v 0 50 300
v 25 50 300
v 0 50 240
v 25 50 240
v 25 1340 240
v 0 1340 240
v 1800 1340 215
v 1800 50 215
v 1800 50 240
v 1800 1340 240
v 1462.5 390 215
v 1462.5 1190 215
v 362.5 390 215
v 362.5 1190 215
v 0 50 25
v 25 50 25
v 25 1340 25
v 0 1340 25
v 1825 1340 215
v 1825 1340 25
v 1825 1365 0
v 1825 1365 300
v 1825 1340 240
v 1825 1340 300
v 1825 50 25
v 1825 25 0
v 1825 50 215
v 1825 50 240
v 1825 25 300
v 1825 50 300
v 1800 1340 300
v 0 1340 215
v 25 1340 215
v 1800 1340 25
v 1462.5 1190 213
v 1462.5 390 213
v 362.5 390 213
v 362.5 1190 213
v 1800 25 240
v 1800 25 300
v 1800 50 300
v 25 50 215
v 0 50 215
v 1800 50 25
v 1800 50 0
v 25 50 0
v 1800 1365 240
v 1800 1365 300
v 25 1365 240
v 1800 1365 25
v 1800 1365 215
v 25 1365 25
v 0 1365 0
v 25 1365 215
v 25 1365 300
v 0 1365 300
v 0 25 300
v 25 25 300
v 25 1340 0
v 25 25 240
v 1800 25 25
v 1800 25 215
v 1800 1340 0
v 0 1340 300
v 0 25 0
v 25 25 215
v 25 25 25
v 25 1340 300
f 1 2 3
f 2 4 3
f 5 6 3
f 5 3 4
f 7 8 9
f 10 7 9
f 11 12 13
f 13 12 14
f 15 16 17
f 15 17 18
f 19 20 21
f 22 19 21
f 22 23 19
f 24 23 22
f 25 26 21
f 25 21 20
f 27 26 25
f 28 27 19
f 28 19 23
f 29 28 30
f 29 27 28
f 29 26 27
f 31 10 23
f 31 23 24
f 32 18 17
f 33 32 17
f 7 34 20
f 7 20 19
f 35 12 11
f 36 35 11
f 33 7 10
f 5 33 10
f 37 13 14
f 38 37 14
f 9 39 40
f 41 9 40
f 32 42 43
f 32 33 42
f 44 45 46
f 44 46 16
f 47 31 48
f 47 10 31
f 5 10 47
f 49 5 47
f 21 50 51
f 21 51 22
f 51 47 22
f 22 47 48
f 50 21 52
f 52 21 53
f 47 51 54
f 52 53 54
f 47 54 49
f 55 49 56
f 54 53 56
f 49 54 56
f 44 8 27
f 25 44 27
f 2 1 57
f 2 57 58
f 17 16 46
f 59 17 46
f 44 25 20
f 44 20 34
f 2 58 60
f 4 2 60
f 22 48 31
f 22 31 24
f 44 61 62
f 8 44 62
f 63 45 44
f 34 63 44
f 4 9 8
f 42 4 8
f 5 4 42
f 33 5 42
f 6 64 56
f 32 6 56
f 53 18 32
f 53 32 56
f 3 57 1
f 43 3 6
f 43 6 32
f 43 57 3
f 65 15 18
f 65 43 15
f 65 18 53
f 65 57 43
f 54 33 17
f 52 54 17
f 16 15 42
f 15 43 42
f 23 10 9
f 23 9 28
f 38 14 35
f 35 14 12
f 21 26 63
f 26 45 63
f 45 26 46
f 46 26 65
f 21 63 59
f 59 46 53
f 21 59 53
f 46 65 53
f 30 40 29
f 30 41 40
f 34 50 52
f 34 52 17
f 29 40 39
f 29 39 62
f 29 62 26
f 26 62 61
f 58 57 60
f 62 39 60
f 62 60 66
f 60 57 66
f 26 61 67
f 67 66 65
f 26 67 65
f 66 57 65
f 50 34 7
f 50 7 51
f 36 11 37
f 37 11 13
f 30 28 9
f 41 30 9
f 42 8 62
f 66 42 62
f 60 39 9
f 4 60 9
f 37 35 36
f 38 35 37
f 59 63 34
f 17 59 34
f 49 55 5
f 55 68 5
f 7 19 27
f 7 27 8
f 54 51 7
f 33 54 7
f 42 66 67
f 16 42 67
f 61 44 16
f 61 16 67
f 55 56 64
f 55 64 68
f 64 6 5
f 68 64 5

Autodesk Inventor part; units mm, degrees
ref_plane "YZ Plane" through (0, 0, 0) normal (1, 0, 0) x (0, 1, 0)
sketch "Sketch1" plane through (0, 0, 0) normal (0, 0, 1) x (1, 0, 0)
  line L0 (0, 0) -> (29.7379, 0) construction
  line L1 (0, 1340) -> (25, 1340)
  line L2 (25, 1340) -> (25, 1365)
  line L3 (25, 1365) -> (0, 1365)
  line L4 (0, 1365) -> (0, 1340)
  line L5 (1800, 1365) -> (1825, 1365)
  line L6 (1825, 1365) -> (1825, 1340)
  line L7 (1825, 1340) -> (1800, 1340)
  line L8 (1800, 1340) -> (1800, 1365)
  line L9 (1734.4226, 849.9895) -> (1993.1274, 849.9895) construction
  dimension "d0" = 25
  dimension "d1" = 25
  dimension "d2" = 1340
  dimension "d3" = 25
  dimension "d4" = 25
  dimension "d5" = 1800
  dimension "d6" = 490.0105
  dimension "d7" = 1340
extrude "Extrusion1" add sketch "Sketch1" along normal blind 300
sketch "Sketch2" plane through (0, 1340, 0) normal (0, -1, 0) x (1, 0, 0)
  line L0 (25, 0) -> (25, 300) projected
  line L1 (0, 300) -> (25, 300) projected
  line L2 (0, 0) -> (0, 300) projected
  line L3 (0, 240) -> (25, 240)
  line L4 (25, 240) -> (25, 215)
  line L5 (25, 215) -> (0, 215)
  line L6 (0, 215) -> (0, 240)
  dimension "d10" = 25
  dimension "d11" = 60
extrude "Extrusion2" add sketch "Sketch2" along normal blind 1315 contours L5 L2 L3 L0
sketch "Sketch4" plane through (0, 25, 240) normal (0, 0, 1) x (1, 0, 0)
  line L0 (25, 1315) -> (25, 0) projected
  line L1 (0, 0) -> (25, 0)
  line L2 (25, 0) -> (25, 25)
  line L3 (25, 25) -> (0, 25)
  line L4 (0, 25) -> (0, 0)
  point P0 (0, -25)
  dimension "d14" = 25
extrude "Extrusion3" add sketch "Sketch4" along normal up to surface (60 mm away)
sketch "Sketch5" plane through (25, 25, 215) normal (0, 0, -1) x (-1, 0, 0)
  line L0 (25, 1315) -> (25, 0) projected
  line L1 (0, 0) -> (25, 0)
  line L2 (25, 0) -> (25, 25)
  line L3 (25, 25) -> (0, 25)
  line L4 (0, 25) -> (0, 0)
  point P0 (25, -25)
  dimension "d17" = 25
extrude "Extrusion4" add sketch "Sketch5" along normal up to surface (215 mm away)
sketch "Sketch6" plane through (0, 50, 215) normal (0, 1, 0) x (1, 0, 0)
  line L0 (25, 0) -> (25, 215) projected
  line L1 (0, 215) -> (25, 215)
  line L2 (25, 215) -> (25, 190)
  line L3 (25, 190) -> (0, 190)
  line L4 (0, 190) -> (0, 215)
  dimension "d20" = 25
extrude "Extrusion5" add sketch "Sketch6" along normal up to surface (1290 mm away)
sketch "Sketch7" plane through (25, 1365, 300) normal (1, 0, 0) x (0, 0, -1)
  line L0 (275, -25) -> (300, -25)
  line L1 (300, -25) -> (300, 0)
  line L2 (300, 0) -> (275, 0)
  line L3 (275, 0) -> (275, -25)
  point P0 (300, -1365)
extrude "Extrusion6" add sketch "Sketch7" along normal up to surface (1775 mm away)
sketch "Sketch8" plane through (25, 25, 0) normal (1, 0, 0) x (0, 0, -1)
  line L0 (-25, 1340) -> (-300, 1340) projected
  line L1 (-215, 1315) -> (-240, 1315)
  line L2 (-240, 1315) -> (-240, 1340)
  line L3 (-240, 1340) -> (-215, 1340)
  line L4 (-215, 1340) -> (-215, 1315)
  point P0 (0, -25)
extrude "Extrusion7" add sketch "Sketch8" along normal up to surface (1775 mm away)
ref_plane "Work Plane1" through (912.5, 1365, 0) normal (-1, 0, 0) x (0, 0, 1)
mirror "Mirror1" about plane through (912.5, 1365, 0) normal (-1, 0, 0) of "Extrusion2", "Extrusion3", "Extrusion4", "Extrusion5"
ref_plane "Work Plane2" through (1800, 695, 0) normal (0, -1, 0) x (1, 0, 0)
mirror "Mirror2" about plane through (1800, 695, 0) normal (0, -1, 0) of "Extrusion7", "Extrusion6"
sketch "Sketch9" plane through (0, 0, 0) normal (0, 0, 1) x (1, 0, 0)
  line L0 (25, 1340) -> (1800, 1340) construction
  line L1 (1800, 1340) -> (1800, 50) construction
  line L2 (25, 1340) -> (25, 50) construction
  line L3 (362.5, 1190) -> (1462.5, 1190)
  line L4 (1462.5, 1190) -> (1462.5, 390)
  line L5 (1462.5, 390) -> (362.5, 390)
  line L6 (362.5, 390) -> (362.5, 1190)
  line L7 (25, 50) -> (1800, 50) construction
  point P0 (0, 0)
  dimension "d29" = 800
  dimension "d30" = 1100
  dimension "d31" = 337.5
  dimension "d33" = 150
sketch "Sketch10" plane through (1825, 50, 215) normal (0, 0, -1) x (-1, 0, 0)
  line L0 (362.5, 340) -> (1462.5, 340) projected
  line L1 (1462.5, 340) -> (1462.5, 1140) projected
  line L2 (1462.5, 1140) -> (362.5, 1140) projected
  line L3 (362.5, 1140) -> (362.5, 340) projected
  point P0 (1825, -50)
extrude "Extrusion8" add sketch "Sketch10" along normal blind 2
properties part number "CloudGraffitiPlotterRig"
